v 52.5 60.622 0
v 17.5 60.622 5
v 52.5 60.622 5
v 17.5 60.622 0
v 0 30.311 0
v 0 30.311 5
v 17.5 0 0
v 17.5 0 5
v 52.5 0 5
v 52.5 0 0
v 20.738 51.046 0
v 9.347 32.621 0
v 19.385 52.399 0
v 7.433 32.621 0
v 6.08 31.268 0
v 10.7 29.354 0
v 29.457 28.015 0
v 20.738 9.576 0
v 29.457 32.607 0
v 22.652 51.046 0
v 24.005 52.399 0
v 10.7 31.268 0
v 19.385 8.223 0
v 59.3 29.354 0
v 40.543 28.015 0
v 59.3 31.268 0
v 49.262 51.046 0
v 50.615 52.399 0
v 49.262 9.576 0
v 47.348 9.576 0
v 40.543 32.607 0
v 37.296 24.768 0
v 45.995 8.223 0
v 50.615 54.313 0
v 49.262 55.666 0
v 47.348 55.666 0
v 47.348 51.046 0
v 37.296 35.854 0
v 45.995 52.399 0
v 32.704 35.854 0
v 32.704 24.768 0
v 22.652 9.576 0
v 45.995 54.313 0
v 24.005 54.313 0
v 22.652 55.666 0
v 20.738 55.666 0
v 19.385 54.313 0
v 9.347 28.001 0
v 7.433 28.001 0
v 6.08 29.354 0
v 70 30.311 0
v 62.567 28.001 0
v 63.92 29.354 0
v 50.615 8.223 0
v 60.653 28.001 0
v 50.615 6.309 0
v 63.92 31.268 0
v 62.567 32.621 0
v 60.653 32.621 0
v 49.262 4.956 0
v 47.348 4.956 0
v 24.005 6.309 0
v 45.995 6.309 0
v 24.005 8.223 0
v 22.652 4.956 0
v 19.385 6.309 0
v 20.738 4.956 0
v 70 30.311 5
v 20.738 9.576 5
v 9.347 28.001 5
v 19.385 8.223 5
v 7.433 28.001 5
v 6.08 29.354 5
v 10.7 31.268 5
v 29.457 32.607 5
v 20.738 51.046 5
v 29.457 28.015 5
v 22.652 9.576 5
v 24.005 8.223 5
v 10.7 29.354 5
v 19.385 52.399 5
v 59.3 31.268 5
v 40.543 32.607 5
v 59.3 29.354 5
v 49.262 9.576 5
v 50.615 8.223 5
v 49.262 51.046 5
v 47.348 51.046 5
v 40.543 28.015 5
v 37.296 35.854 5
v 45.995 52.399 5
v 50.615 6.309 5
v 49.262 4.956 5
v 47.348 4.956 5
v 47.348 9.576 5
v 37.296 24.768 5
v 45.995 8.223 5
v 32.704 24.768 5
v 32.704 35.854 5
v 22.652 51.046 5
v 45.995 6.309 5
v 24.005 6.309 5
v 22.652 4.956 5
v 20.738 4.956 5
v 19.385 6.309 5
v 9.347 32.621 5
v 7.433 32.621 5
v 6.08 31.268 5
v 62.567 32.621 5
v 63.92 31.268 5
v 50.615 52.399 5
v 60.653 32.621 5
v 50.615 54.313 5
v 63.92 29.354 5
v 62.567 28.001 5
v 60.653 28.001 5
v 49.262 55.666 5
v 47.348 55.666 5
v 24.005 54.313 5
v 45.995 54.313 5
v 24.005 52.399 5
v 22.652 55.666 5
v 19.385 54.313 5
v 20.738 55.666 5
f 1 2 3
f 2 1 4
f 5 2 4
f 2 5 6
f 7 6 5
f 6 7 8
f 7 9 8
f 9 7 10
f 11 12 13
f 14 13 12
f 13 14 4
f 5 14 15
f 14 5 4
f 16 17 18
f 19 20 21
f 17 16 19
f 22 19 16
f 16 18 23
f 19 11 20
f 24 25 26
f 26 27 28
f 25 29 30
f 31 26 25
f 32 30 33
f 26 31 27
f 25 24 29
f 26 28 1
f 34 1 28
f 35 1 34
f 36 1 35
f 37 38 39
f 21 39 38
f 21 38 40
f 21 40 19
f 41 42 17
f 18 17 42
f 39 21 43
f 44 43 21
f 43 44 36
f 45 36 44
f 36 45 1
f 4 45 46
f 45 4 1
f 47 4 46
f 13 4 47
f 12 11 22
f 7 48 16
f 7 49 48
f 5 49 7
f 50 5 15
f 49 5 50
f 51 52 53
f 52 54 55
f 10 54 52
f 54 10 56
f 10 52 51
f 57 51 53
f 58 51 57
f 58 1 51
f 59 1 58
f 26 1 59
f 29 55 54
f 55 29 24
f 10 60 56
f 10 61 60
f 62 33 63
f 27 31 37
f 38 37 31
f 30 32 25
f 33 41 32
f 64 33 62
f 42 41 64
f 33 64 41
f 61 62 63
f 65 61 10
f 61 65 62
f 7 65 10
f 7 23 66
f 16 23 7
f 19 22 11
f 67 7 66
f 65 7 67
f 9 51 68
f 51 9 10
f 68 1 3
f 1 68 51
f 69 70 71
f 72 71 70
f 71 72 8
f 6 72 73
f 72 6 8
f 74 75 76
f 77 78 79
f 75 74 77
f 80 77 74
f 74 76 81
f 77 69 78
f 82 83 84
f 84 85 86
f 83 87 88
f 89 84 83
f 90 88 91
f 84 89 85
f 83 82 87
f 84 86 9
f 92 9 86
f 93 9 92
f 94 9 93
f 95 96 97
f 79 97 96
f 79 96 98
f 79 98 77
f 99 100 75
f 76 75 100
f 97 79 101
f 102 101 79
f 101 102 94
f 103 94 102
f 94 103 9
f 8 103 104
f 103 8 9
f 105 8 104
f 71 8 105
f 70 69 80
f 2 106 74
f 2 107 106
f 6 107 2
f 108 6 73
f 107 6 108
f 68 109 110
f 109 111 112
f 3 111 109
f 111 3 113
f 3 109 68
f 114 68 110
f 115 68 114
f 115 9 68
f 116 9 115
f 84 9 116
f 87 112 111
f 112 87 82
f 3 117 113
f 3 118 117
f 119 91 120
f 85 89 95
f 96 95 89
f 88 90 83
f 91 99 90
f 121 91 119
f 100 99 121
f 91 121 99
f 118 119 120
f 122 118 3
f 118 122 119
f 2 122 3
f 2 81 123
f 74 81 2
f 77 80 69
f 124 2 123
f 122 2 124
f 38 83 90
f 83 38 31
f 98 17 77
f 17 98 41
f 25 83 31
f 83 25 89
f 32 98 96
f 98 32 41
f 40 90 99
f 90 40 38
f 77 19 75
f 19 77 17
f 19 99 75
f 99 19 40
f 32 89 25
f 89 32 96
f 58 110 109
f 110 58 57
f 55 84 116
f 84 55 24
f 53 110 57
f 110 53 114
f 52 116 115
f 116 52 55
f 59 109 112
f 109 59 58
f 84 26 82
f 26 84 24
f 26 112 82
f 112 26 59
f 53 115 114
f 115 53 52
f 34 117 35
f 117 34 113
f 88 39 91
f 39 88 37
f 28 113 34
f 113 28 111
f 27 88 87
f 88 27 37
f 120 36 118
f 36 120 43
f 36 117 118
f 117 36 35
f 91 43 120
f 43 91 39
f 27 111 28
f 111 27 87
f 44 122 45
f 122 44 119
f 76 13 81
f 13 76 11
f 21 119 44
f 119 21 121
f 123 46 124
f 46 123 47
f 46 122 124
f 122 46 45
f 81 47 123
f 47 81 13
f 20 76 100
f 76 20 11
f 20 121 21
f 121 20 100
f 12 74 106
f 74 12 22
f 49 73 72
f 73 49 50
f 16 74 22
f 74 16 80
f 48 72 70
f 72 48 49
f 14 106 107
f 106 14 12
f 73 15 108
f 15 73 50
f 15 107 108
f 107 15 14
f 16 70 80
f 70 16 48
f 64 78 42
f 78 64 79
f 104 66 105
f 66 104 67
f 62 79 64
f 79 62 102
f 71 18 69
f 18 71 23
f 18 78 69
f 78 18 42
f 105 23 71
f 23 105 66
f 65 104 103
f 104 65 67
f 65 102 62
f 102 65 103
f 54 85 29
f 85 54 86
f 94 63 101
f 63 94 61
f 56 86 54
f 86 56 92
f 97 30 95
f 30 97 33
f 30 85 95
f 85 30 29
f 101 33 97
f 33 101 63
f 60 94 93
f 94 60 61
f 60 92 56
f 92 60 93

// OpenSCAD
$fn = 32;

// ----------------------------------------------------------------------
// Polygon plate: 6-gon R35, 6 bolt windows
// ----------------------------------------------------------------------

// --- parameters (mm) ---
sides = 6;                // number of polygon sides
plate_r = 35;             // circumscribed radius of the polygon
bore_r = 6;               // centre bore radius
bolts = 6;                // number of bolt windows
ring_r = 26.61;           // bolt-circle radius
bolt_r = 2.5;             // bolt window radius
plate_t = 5;              // plate thickness, Z (extrusion height)

plate_d = 2 * plate_r;  // circumscribed diameter
bore_d = 2 * bore_r;  // centre bore diameter
bolt_d = 2 * bolt_r;  // bolt window diameter
ring_d = 2 * ring_r;  // bolt-circle diameter

profile = [[70, 30.311], [52.5, 60.622], [17.5, 60.622], [0, 30.311], [17.5, 0], [52.5, 0]];  // primary outline, 6 points, counter clockwise
void_1 = [[40.543, 32.607], [37.296, 35.854], [32.704, 35.854], [29.457, 32.607], [29.457, 28.015], [32.704, 24.768], [37.296, 24.768], [40.543, 28.015]];  // centre bore, 8 points
void_2 = [[63.92, 31.268], [62.567, 32.621], [60.653, 32.621], [59.3, 31.268], [59.3, 29.354], [60.653, 28.001], [62.567, 28.001], [63.92, 29.354]];  // bolt window 1, 8 points
void_3 = [[50.615, 54.313], [49.262, 55.666], [47.348, 55.666], [45.995, 54.313], [45.995, 52.399], [47.348, 51.046], [49.262, 51.046], [50.615, 52.399]];  // bolt window 2, 8 points
void_4 = [[24.005, 54.313], [22.652, 55.666], [20.738, 55.666], [19.385, 54.313], [19.385, 52.399], [20.738, 51.046], [22.652, 51.046], [24.005, 52.399]];  // bolt window 3, 8 points
void_5 = [[10.7, 31.268], [9.347, 32.621], [7.433, 32.621], [6.08, 31.268], [6.08, 29.354], [7.433, 28.001], [9.347, 28.001], [10.7, 29.354]];  // bolt window 4, 8 points
void_6 = [[24.005, 8.223], [22.652, 9.576], [20.738, 9.576], [19.385, 8.223], [19.385, 6.309], [20.738, 4.956], [22.652, 4.956], [24.005, 6.309]];  // bolt window 5, 8 points
void_7 = [[50.615, 8.223], [49.262, 9.576], [47.348, 9.576], [45.995, 8.223], [45.995, 6.309], [47.348, 4.956], [49.262, 4.956], [50.615, 6.309]];  // bolt window 6, 8 points

// --- the one profile operation ---
difference() {
  linear_extrude(height = plate_t) polygon(points = profile);
  translate([0, 0, -1])
    linear_extrude(height = plate_t + 2) polygon(points = void_1);
  translate([0, 0, -1])
    linear_extrude(height = plate_t + 2) polygon(points = void_2);
  translate([0, 0, -1])
    linear_extrude(height = plate_t + 2) polygon(points = void_3);
  translate([0, 0, -1])
    linear_extrude(height = plate_t + 2) polygon(points = void_4);
  translate([0, 0, -1])
    linear_extrude(height = plate_t + 2) polygon(points = void_5);
  translate([0, 0, -1])
    linear_extrude(height = plate_t + 2) polygon(points = void_6);
  translate([0, 0, -1])
    linear_extrude(height = plate_t + 2) polygon(points = void_7);
}
